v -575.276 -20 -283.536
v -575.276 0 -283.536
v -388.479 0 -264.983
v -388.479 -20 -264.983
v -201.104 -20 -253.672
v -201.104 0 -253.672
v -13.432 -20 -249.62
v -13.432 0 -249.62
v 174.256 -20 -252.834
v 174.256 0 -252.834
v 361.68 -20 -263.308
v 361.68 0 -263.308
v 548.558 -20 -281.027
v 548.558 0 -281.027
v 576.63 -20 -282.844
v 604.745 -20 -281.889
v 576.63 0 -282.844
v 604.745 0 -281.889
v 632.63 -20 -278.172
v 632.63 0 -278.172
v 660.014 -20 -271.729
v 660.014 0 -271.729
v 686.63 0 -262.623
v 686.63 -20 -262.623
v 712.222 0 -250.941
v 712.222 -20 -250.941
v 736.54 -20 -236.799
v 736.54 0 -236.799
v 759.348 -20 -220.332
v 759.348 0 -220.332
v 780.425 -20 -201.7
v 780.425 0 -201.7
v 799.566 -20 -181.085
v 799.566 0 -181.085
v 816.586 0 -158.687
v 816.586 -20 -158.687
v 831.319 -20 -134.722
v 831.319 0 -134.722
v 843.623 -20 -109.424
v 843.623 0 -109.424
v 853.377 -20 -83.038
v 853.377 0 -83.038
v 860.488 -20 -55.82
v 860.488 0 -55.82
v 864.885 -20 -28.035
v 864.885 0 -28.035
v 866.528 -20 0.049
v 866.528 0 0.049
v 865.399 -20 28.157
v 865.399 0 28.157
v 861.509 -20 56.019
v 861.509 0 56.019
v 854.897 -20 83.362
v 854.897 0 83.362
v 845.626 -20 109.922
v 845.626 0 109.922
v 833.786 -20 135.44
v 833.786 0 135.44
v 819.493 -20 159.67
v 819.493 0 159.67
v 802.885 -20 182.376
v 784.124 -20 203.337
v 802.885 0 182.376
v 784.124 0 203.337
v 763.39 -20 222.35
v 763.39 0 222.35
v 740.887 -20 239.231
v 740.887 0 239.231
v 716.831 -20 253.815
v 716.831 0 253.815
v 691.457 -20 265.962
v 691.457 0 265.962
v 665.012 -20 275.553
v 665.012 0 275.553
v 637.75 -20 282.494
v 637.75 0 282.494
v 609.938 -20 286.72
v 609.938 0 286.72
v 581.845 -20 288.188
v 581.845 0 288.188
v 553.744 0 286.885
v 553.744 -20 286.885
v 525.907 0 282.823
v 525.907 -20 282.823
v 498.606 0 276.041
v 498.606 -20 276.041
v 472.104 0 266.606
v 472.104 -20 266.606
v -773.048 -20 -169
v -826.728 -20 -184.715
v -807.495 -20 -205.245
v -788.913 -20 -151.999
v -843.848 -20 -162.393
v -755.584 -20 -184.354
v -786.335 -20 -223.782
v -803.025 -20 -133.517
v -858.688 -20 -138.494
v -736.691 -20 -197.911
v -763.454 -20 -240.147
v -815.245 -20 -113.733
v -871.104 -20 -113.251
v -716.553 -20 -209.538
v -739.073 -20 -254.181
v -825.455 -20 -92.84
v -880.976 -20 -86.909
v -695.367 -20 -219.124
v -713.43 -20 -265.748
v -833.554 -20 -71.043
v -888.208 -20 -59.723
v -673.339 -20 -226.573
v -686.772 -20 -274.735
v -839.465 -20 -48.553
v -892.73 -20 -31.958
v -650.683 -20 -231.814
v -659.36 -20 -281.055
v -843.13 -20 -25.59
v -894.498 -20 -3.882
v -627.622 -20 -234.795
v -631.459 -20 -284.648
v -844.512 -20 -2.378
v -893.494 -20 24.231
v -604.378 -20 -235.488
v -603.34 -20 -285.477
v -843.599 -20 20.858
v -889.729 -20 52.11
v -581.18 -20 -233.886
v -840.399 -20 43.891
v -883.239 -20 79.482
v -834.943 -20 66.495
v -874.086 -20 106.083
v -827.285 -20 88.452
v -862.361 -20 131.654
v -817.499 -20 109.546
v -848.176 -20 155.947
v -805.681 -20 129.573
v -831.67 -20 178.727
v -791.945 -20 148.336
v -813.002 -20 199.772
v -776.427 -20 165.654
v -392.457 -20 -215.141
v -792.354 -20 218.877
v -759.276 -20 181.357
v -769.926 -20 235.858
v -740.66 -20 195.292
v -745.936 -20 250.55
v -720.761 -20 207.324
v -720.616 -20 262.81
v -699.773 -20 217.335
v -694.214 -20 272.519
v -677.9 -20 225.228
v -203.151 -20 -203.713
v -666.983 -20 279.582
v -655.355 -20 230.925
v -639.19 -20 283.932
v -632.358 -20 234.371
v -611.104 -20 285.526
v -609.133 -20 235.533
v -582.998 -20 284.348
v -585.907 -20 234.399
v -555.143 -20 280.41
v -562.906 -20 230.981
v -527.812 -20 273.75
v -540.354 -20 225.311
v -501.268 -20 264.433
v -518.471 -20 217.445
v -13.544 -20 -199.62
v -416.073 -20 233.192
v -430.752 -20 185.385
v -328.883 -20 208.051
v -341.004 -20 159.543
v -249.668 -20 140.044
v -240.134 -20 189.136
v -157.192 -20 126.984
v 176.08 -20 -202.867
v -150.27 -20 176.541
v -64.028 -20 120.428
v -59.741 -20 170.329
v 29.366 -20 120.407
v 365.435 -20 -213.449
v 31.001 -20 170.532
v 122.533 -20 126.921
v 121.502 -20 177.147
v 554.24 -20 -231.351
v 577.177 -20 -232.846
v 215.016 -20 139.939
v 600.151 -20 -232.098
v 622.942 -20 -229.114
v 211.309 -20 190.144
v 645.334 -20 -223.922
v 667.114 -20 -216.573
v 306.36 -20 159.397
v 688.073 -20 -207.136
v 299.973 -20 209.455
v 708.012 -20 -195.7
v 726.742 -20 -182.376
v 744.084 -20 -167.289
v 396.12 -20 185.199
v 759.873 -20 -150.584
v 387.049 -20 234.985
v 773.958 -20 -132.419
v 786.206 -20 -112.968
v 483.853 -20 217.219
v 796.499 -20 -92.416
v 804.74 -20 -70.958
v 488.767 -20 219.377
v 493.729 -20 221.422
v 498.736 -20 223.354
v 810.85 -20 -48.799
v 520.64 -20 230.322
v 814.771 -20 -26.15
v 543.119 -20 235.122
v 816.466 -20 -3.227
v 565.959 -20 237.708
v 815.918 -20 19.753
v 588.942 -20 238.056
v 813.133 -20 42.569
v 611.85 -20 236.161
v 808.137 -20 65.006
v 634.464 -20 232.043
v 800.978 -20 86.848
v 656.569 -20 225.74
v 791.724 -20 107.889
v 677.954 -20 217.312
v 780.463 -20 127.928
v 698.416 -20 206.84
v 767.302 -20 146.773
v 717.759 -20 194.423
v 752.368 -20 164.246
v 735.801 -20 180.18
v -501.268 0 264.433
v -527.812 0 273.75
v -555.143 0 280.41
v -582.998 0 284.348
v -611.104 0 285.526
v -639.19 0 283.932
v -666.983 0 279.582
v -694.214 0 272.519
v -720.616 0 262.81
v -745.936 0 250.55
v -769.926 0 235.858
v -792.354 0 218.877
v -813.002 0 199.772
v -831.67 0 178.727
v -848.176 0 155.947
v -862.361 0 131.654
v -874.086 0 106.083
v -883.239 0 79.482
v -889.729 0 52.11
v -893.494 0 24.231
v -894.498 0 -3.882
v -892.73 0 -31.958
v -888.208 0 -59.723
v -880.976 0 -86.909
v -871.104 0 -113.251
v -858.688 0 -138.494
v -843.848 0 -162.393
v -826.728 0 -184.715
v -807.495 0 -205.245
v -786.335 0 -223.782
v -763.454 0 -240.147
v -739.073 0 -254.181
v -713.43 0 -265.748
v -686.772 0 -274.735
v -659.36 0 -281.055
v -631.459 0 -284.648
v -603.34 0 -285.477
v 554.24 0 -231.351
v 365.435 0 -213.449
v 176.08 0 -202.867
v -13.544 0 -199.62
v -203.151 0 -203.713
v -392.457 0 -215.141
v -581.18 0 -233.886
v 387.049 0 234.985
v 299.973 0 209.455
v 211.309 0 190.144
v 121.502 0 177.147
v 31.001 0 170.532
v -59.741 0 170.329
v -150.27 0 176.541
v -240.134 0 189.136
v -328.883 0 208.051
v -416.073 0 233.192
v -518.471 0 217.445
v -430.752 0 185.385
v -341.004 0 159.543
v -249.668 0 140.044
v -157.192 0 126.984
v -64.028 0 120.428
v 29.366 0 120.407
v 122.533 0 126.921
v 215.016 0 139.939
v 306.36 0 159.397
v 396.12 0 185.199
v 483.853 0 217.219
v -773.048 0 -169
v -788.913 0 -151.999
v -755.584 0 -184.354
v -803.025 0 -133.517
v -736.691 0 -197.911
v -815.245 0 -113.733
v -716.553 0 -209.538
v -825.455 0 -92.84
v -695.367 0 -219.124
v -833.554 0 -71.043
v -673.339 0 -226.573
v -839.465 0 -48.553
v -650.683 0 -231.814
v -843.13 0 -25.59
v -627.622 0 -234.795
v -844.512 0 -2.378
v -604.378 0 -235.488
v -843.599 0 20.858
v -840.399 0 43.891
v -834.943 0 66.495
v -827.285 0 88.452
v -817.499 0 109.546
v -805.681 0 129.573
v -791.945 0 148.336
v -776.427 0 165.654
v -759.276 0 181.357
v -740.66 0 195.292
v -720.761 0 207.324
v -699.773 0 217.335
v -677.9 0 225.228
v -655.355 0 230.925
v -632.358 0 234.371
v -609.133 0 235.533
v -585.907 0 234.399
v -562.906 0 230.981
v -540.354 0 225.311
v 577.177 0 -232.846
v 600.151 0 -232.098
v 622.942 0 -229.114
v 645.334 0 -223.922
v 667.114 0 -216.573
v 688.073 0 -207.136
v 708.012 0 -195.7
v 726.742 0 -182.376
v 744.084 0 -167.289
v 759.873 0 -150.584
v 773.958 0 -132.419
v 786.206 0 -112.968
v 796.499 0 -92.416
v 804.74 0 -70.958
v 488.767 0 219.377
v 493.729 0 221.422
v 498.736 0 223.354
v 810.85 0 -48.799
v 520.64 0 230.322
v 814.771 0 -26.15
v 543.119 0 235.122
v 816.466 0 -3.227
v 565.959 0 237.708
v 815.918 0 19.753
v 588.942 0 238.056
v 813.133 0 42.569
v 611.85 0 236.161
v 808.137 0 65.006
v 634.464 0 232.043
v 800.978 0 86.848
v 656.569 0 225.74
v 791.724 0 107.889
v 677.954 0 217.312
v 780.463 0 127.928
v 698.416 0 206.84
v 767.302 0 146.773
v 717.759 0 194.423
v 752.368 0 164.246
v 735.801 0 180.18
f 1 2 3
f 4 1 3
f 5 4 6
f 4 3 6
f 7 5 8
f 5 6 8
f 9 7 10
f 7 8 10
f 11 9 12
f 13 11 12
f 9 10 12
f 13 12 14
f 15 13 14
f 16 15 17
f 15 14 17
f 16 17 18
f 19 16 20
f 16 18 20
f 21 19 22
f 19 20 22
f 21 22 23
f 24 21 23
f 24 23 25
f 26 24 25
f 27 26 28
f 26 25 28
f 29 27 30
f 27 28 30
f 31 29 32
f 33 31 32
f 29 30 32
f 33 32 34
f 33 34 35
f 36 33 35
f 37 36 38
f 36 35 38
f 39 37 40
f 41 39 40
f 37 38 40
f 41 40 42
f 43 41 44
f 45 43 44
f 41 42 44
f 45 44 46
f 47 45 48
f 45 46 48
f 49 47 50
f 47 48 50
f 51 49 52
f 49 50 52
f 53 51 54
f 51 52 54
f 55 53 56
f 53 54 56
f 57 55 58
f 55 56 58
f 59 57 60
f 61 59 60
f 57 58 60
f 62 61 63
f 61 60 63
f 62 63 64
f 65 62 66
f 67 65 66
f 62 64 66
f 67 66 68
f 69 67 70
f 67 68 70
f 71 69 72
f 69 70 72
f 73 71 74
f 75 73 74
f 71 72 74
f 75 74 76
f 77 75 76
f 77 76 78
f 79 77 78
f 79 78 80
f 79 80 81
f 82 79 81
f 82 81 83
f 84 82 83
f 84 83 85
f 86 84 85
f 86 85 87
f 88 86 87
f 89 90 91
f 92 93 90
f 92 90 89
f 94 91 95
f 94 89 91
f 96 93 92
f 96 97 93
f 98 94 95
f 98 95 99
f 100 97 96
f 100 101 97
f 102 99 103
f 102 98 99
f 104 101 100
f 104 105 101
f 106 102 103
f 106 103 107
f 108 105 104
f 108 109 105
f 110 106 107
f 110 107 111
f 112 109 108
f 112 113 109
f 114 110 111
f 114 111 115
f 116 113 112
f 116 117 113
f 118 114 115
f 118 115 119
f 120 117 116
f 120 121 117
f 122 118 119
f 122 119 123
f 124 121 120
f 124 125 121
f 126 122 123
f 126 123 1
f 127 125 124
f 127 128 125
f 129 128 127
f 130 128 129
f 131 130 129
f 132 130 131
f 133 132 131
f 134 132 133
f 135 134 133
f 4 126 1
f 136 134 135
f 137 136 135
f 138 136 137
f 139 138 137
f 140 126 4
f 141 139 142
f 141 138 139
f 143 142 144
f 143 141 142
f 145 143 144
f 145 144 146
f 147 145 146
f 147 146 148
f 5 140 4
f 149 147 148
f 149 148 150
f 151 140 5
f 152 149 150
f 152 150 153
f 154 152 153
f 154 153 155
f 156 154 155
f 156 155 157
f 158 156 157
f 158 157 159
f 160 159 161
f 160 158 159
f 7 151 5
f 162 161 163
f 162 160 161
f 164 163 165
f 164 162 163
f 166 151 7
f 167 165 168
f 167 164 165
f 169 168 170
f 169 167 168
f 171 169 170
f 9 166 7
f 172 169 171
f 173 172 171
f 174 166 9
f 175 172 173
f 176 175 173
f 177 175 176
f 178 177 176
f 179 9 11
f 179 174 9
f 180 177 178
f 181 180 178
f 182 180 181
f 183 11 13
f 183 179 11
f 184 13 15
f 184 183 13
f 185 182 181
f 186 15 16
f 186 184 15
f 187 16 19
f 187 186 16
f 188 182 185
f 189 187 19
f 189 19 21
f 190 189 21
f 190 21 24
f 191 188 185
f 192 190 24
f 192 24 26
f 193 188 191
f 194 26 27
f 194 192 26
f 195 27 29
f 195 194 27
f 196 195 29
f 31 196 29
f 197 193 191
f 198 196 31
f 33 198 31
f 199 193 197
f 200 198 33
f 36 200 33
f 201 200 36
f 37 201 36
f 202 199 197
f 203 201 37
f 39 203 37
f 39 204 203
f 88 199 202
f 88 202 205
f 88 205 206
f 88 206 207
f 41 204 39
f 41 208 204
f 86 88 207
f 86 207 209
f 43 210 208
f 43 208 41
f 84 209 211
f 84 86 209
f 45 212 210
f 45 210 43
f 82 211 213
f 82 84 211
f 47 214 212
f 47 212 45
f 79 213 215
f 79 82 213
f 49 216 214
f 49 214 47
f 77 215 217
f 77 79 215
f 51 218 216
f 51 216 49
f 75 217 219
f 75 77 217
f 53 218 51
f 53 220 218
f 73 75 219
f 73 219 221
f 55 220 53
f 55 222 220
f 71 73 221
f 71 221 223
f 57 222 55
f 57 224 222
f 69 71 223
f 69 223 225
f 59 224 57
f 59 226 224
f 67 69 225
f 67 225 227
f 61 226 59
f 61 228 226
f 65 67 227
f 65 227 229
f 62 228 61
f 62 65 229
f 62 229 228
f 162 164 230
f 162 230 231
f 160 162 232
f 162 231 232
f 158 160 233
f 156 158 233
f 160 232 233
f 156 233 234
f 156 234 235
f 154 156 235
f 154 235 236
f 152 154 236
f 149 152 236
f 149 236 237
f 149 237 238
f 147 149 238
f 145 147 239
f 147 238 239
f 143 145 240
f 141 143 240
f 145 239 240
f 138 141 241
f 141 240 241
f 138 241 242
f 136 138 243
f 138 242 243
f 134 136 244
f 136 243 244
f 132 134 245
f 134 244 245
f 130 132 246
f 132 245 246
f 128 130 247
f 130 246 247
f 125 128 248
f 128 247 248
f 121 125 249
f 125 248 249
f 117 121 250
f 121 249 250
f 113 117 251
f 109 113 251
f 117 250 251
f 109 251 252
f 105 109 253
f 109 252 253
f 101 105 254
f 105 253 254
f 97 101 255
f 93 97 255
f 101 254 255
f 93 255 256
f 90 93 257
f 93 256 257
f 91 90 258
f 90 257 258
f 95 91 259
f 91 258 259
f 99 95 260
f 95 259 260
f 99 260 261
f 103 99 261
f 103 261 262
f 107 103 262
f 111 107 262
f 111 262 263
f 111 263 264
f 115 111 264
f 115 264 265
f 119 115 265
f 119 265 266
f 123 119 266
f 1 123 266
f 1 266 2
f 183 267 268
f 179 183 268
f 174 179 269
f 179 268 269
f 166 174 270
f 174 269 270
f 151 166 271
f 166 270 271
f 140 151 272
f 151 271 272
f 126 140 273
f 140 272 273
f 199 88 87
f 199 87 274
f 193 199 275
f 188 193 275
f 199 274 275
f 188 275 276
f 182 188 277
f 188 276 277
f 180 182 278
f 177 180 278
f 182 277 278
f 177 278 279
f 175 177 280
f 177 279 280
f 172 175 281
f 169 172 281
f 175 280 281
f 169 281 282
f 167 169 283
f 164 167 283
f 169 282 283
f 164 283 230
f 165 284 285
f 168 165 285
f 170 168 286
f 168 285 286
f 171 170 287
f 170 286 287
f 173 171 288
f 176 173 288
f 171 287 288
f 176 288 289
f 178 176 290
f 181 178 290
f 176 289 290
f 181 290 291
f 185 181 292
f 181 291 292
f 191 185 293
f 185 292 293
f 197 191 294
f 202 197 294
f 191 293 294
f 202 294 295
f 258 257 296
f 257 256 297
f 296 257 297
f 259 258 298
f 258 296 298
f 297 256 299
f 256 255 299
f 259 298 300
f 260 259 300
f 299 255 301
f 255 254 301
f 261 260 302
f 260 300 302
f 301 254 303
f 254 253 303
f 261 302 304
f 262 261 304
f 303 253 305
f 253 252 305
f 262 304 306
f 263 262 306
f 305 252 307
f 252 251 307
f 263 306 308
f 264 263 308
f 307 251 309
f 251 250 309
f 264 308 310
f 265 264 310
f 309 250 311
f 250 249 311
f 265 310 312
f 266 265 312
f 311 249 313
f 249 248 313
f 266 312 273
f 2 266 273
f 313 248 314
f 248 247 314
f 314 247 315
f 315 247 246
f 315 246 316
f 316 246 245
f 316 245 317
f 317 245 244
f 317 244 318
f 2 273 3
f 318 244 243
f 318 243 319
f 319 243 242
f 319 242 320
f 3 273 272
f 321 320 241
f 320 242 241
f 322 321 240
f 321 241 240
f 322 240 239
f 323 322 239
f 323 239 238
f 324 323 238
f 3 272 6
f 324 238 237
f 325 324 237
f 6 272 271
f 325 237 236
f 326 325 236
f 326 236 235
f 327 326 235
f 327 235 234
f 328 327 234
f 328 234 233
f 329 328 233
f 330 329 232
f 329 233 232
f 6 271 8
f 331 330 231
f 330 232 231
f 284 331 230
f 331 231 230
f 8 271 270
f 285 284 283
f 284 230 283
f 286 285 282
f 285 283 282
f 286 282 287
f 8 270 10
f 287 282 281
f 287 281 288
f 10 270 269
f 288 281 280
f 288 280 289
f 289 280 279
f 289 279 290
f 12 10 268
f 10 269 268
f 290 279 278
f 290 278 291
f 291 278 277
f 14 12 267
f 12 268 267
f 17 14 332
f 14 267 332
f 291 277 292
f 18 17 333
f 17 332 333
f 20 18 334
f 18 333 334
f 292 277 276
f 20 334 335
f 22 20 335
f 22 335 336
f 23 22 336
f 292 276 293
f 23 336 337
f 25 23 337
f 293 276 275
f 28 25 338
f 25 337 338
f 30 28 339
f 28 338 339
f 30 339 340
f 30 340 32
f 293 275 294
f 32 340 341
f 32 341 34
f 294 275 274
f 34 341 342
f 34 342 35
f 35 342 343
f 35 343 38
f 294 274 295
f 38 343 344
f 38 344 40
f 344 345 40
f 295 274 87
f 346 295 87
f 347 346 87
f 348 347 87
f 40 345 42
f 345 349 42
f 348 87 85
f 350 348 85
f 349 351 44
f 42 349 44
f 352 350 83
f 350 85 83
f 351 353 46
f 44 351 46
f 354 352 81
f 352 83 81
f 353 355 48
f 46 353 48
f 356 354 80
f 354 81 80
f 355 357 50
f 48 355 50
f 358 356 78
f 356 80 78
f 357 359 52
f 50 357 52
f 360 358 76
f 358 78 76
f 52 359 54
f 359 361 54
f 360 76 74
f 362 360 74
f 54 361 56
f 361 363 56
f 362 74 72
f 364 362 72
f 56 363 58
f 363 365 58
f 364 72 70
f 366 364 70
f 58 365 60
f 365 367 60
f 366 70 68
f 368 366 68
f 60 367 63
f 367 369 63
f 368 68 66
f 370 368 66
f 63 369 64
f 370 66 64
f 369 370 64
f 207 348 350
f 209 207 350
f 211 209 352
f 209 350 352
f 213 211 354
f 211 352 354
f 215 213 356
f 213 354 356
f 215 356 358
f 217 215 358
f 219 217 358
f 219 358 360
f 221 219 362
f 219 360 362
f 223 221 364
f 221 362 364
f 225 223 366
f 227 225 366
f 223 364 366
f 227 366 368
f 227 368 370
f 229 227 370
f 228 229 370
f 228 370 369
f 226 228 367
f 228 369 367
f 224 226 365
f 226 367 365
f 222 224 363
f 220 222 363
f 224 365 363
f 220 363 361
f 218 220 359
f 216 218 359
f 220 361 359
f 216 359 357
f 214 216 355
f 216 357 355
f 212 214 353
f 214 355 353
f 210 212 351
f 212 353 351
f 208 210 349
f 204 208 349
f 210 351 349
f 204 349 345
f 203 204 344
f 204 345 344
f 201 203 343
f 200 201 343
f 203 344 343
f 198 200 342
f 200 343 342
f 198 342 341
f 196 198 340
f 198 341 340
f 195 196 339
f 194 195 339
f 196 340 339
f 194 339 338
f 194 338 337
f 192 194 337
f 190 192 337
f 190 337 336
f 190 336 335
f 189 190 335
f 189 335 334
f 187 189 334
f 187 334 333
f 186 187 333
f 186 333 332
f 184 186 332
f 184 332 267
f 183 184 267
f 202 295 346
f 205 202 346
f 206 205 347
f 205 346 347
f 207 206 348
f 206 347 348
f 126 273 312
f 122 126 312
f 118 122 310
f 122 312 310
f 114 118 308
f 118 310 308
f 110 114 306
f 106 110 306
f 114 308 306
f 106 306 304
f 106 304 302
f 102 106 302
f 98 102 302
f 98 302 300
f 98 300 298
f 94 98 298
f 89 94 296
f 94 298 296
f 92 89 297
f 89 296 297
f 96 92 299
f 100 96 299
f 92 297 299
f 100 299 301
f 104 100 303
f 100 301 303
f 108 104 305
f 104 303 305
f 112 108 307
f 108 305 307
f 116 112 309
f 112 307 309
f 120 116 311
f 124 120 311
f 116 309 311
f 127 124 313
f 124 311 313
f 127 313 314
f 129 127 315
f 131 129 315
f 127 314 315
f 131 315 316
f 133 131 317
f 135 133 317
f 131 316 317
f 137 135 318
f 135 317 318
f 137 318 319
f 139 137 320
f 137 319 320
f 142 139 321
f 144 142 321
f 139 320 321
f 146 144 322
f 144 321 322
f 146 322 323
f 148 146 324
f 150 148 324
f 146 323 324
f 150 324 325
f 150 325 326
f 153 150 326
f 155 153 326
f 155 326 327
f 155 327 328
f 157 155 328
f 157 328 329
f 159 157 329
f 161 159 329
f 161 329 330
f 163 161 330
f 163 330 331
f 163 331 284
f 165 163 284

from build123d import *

# Parameters (mm, degrees)
F1_DEPTH = 20


with BuildPart() as f1:
    # F0 (on Front) → F1 (new body)
    with BuildSketch(Plane.XZ):
        with BuildLine():
            ThreePointArc((-575.276073, -283.535894), (-13.43211, -249.619942), (548.557665, -281.027318))
            ThreePointArc((548.557665, -281.027318), (863.797054, 42.135967), (472.103942, 266.606204))
            ThreePointArc((472.103942, 266.606204), (-14.367937, 169.627757), (-501.26791, 264.433483))
            ThreePointArc((-501.26791, 264.433483), (-891.955016, 38.216849), (-575.276073, -283.535894))
        make_face()
        with BuildLine():
            ThreePointArc((-581.179886, -233.885667), (-842.283064, 32.413932), (-518.471458, 217.444713))
            ThreePointArc((-518.471458, 217.444713), (-17.331035, 119.5998), (483.85336, 217.21923))
            ThreePointArc((483.85336, 217.21923), (491.242064, 220.413793), (498.735616, 223.354006))
            ThreePointArc((498.735616, 223.354006), (814.804212, 31.195097), (554.239766, -231.35123))
            ThreePointArc((554.239766, -231.35123), (-13.543718, -199.620066), (-581.179886, -233.885667))
        make_face(mode=Mode.SUBTRACT)
    extrude(amount=F1_DEPTH)


solid = f1.part
